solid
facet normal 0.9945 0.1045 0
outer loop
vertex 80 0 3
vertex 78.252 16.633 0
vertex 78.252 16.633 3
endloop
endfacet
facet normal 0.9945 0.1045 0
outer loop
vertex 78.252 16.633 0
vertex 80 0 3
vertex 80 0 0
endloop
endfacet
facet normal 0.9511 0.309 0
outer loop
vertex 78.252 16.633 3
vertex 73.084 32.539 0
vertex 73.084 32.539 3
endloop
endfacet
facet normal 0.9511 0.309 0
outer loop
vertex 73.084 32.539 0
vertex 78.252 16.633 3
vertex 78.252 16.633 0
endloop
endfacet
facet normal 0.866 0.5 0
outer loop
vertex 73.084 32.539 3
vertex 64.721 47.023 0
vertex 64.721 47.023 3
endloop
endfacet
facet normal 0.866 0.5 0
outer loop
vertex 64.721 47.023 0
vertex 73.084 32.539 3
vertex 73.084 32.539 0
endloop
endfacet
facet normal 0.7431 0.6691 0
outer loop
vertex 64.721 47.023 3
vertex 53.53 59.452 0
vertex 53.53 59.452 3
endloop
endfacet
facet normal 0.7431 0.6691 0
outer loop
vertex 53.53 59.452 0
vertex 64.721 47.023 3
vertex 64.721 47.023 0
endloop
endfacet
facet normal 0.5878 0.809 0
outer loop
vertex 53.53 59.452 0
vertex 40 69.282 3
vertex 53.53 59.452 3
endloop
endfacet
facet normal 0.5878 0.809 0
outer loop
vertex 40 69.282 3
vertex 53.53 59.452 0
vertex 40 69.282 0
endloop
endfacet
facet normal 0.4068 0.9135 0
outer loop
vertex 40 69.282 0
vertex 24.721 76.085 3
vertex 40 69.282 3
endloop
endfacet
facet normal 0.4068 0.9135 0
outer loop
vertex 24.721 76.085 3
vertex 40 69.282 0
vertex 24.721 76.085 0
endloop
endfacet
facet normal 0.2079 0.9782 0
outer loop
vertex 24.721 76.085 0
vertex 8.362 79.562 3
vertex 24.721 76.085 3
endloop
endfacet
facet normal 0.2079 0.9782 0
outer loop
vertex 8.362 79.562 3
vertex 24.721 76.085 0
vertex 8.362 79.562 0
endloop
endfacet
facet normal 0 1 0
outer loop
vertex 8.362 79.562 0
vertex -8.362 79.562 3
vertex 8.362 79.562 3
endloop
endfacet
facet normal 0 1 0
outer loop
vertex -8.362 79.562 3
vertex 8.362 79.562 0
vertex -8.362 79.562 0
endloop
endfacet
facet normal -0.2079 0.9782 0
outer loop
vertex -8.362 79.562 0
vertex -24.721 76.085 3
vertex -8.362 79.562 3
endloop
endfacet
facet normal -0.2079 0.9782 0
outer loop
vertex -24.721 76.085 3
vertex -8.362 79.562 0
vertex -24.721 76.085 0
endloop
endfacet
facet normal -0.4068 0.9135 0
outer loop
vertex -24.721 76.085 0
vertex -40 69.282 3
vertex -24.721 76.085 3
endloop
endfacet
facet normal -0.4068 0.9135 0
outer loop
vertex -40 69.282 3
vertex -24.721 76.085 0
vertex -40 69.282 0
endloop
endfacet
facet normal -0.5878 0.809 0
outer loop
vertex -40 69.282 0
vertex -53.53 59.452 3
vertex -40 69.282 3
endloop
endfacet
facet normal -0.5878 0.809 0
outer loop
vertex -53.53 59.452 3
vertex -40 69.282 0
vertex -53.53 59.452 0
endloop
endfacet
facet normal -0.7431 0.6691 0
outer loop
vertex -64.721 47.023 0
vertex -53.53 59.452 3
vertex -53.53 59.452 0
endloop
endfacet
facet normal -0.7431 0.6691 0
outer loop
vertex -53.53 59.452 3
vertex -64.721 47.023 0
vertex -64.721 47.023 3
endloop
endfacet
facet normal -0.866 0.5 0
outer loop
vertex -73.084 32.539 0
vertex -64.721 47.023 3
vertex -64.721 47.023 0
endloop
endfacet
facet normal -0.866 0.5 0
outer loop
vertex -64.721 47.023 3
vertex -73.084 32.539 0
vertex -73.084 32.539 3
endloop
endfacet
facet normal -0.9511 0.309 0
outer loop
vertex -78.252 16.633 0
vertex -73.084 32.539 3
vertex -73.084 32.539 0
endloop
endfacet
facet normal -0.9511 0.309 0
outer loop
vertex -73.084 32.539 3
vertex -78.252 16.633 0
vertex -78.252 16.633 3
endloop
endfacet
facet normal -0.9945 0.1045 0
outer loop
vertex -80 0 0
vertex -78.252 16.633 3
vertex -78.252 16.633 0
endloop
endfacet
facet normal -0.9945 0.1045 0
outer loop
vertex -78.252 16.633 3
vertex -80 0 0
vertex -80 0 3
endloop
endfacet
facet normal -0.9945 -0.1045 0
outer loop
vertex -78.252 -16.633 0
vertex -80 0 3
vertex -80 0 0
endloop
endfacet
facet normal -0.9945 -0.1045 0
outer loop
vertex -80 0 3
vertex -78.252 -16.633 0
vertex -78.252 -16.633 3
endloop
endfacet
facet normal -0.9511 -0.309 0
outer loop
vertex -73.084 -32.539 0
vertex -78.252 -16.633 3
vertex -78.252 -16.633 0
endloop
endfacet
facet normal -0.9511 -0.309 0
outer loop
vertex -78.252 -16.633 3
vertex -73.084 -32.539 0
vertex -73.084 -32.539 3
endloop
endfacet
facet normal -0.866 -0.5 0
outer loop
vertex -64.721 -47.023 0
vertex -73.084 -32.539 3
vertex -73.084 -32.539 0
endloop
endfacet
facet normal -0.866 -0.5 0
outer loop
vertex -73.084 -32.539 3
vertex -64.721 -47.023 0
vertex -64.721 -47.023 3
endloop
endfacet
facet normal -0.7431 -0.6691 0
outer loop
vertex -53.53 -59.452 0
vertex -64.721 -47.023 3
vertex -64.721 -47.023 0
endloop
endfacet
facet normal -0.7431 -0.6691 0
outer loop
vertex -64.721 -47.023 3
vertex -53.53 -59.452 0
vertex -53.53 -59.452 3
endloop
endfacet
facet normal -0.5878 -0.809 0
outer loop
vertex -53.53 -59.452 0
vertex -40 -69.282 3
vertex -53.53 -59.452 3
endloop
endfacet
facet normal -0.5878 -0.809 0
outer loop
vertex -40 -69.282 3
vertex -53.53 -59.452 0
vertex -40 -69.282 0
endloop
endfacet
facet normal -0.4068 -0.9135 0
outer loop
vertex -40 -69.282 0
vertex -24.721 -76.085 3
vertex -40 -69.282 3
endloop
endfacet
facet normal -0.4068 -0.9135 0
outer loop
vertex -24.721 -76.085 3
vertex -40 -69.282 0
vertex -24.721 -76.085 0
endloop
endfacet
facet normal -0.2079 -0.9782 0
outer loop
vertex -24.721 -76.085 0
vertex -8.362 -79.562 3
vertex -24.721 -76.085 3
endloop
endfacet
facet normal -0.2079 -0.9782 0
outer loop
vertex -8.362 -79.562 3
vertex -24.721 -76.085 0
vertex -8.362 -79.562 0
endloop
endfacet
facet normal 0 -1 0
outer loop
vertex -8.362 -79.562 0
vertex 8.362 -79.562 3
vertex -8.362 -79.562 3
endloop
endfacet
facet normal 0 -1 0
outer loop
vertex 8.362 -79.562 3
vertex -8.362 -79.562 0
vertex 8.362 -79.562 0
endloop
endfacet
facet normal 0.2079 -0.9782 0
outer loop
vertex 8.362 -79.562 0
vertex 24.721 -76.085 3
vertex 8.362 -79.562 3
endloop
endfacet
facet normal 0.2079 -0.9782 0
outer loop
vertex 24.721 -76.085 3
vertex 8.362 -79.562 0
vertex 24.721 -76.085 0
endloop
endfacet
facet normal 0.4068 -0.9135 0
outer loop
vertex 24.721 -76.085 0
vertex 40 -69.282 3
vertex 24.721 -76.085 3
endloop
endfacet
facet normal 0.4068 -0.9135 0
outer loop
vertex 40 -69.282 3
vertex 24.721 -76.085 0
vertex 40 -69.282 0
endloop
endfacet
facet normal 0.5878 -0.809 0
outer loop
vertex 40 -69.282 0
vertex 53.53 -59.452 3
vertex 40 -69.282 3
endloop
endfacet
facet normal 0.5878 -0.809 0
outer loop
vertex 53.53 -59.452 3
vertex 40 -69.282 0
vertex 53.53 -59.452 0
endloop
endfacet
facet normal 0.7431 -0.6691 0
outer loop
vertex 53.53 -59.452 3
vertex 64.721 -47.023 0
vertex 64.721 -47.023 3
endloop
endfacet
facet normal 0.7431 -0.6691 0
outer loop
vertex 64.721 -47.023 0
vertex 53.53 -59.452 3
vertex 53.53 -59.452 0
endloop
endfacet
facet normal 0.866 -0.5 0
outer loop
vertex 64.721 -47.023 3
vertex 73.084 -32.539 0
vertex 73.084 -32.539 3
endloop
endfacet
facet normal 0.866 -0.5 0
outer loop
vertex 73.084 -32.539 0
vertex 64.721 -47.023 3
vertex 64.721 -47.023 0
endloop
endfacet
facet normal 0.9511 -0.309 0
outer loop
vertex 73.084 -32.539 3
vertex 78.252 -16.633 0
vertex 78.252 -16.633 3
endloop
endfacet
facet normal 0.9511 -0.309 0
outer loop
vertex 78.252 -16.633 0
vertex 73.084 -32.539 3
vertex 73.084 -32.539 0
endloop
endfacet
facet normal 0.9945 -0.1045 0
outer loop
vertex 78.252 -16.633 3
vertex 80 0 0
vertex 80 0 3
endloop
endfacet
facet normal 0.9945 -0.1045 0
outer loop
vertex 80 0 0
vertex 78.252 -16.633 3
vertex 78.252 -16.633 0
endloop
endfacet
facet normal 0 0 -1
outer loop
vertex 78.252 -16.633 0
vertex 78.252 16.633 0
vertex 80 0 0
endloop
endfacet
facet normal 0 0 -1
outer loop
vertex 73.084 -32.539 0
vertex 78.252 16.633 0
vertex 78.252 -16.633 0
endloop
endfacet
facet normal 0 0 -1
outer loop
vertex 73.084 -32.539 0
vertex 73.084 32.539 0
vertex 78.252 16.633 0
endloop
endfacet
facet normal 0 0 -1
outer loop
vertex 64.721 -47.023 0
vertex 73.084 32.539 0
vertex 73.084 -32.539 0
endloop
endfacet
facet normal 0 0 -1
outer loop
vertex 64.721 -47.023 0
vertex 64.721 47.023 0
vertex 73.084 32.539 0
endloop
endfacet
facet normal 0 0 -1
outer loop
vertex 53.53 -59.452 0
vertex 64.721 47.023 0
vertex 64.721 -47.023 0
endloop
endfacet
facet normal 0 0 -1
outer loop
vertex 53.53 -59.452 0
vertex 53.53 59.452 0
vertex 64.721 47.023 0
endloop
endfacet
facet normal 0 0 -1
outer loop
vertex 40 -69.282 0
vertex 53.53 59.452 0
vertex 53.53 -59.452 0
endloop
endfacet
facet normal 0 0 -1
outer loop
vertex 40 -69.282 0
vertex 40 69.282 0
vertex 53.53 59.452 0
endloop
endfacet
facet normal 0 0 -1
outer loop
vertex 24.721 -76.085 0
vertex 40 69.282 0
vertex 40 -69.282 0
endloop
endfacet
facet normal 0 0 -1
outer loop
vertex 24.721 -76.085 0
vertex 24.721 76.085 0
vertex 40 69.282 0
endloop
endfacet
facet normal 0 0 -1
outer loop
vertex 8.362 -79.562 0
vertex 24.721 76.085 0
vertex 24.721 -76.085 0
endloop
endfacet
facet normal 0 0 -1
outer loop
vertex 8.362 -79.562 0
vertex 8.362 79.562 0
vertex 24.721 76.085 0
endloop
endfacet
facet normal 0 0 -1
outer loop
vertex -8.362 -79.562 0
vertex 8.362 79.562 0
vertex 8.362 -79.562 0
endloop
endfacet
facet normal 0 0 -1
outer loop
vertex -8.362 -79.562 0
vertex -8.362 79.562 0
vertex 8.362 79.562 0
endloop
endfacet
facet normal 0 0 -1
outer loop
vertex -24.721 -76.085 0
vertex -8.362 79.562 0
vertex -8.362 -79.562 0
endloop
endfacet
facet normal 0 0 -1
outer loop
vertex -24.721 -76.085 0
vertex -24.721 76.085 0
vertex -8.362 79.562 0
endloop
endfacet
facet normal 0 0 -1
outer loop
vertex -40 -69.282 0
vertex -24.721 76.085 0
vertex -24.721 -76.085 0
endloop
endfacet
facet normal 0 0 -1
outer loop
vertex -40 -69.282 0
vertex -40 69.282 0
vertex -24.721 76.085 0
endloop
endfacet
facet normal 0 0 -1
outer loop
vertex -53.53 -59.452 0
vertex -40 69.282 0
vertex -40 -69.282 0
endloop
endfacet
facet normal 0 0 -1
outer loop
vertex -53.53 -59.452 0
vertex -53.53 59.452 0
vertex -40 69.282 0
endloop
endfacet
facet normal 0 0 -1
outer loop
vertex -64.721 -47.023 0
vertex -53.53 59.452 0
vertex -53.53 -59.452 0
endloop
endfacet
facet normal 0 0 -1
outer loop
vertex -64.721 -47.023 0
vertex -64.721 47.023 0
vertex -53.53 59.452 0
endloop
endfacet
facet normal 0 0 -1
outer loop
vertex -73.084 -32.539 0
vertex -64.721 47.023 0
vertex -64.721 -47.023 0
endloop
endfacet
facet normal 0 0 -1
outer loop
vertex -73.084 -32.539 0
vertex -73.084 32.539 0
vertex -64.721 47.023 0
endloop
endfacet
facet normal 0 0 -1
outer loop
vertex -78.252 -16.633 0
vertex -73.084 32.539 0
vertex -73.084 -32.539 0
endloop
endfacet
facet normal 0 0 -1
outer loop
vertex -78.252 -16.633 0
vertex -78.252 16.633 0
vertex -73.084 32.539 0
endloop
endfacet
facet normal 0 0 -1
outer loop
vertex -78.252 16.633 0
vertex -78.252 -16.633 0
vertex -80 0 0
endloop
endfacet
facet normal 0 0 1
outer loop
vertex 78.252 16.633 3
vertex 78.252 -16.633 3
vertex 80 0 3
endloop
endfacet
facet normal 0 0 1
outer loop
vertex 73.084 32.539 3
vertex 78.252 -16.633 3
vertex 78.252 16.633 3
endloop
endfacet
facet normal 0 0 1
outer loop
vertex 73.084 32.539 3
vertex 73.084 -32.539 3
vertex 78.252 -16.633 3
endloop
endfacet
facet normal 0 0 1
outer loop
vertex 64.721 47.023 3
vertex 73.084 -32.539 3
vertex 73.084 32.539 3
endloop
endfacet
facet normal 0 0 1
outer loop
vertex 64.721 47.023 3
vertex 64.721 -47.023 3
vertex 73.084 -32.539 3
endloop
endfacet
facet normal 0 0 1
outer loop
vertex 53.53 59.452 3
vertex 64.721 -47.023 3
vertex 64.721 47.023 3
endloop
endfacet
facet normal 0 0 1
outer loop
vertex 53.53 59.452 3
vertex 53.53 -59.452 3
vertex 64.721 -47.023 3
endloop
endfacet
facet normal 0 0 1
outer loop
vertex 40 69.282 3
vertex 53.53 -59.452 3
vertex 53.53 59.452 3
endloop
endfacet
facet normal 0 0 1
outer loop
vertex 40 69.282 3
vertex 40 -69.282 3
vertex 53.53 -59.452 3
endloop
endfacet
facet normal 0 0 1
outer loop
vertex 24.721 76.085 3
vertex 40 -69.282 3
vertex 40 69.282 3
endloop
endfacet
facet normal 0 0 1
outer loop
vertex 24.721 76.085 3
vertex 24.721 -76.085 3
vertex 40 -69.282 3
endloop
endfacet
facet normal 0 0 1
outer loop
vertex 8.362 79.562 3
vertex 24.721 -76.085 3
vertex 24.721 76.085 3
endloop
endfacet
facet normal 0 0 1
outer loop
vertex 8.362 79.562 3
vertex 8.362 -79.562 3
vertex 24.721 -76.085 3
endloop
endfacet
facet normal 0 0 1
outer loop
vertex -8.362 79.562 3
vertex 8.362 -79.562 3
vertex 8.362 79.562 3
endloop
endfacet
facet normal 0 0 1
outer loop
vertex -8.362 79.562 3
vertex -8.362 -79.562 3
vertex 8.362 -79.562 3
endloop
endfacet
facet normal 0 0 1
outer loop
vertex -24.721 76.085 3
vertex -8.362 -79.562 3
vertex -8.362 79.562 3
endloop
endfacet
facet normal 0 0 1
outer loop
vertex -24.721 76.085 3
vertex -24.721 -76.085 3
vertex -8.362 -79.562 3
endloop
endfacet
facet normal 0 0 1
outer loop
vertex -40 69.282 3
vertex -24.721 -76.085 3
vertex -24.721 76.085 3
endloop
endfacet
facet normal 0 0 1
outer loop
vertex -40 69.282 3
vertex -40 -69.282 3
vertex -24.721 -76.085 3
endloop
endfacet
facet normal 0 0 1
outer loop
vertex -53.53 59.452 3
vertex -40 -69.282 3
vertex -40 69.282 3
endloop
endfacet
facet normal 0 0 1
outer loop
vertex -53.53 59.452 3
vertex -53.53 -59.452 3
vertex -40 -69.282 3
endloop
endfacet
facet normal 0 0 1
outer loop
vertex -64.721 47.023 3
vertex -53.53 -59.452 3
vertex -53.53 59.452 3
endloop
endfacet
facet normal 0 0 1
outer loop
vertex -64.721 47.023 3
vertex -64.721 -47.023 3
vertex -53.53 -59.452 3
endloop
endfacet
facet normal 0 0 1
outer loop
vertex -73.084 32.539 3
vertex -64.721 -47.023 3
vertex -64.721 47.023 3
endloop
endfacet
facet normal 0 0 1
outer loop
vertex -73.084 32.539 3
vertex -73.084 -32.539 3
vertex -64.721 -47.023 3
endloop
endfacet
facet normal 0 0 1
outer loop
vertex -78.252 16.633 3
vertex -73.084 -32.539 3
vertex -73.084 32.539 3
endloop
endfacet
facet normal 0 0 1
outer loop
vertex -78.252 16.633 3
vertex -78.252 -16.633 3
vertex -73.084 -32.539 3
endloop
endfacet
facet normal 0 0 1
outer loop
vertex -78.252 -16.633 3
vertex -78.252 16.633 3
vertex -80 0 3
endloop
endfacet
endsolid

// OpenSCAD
// CSG file generated from FreeCAD 0.21.2
group() {
 group(){
cylinder($fn = 0, $fa = 12.000000, $fs = 2.000000, h = 3.0, r1 = 80.0, r2 = 80.0, center = false);
}
}
